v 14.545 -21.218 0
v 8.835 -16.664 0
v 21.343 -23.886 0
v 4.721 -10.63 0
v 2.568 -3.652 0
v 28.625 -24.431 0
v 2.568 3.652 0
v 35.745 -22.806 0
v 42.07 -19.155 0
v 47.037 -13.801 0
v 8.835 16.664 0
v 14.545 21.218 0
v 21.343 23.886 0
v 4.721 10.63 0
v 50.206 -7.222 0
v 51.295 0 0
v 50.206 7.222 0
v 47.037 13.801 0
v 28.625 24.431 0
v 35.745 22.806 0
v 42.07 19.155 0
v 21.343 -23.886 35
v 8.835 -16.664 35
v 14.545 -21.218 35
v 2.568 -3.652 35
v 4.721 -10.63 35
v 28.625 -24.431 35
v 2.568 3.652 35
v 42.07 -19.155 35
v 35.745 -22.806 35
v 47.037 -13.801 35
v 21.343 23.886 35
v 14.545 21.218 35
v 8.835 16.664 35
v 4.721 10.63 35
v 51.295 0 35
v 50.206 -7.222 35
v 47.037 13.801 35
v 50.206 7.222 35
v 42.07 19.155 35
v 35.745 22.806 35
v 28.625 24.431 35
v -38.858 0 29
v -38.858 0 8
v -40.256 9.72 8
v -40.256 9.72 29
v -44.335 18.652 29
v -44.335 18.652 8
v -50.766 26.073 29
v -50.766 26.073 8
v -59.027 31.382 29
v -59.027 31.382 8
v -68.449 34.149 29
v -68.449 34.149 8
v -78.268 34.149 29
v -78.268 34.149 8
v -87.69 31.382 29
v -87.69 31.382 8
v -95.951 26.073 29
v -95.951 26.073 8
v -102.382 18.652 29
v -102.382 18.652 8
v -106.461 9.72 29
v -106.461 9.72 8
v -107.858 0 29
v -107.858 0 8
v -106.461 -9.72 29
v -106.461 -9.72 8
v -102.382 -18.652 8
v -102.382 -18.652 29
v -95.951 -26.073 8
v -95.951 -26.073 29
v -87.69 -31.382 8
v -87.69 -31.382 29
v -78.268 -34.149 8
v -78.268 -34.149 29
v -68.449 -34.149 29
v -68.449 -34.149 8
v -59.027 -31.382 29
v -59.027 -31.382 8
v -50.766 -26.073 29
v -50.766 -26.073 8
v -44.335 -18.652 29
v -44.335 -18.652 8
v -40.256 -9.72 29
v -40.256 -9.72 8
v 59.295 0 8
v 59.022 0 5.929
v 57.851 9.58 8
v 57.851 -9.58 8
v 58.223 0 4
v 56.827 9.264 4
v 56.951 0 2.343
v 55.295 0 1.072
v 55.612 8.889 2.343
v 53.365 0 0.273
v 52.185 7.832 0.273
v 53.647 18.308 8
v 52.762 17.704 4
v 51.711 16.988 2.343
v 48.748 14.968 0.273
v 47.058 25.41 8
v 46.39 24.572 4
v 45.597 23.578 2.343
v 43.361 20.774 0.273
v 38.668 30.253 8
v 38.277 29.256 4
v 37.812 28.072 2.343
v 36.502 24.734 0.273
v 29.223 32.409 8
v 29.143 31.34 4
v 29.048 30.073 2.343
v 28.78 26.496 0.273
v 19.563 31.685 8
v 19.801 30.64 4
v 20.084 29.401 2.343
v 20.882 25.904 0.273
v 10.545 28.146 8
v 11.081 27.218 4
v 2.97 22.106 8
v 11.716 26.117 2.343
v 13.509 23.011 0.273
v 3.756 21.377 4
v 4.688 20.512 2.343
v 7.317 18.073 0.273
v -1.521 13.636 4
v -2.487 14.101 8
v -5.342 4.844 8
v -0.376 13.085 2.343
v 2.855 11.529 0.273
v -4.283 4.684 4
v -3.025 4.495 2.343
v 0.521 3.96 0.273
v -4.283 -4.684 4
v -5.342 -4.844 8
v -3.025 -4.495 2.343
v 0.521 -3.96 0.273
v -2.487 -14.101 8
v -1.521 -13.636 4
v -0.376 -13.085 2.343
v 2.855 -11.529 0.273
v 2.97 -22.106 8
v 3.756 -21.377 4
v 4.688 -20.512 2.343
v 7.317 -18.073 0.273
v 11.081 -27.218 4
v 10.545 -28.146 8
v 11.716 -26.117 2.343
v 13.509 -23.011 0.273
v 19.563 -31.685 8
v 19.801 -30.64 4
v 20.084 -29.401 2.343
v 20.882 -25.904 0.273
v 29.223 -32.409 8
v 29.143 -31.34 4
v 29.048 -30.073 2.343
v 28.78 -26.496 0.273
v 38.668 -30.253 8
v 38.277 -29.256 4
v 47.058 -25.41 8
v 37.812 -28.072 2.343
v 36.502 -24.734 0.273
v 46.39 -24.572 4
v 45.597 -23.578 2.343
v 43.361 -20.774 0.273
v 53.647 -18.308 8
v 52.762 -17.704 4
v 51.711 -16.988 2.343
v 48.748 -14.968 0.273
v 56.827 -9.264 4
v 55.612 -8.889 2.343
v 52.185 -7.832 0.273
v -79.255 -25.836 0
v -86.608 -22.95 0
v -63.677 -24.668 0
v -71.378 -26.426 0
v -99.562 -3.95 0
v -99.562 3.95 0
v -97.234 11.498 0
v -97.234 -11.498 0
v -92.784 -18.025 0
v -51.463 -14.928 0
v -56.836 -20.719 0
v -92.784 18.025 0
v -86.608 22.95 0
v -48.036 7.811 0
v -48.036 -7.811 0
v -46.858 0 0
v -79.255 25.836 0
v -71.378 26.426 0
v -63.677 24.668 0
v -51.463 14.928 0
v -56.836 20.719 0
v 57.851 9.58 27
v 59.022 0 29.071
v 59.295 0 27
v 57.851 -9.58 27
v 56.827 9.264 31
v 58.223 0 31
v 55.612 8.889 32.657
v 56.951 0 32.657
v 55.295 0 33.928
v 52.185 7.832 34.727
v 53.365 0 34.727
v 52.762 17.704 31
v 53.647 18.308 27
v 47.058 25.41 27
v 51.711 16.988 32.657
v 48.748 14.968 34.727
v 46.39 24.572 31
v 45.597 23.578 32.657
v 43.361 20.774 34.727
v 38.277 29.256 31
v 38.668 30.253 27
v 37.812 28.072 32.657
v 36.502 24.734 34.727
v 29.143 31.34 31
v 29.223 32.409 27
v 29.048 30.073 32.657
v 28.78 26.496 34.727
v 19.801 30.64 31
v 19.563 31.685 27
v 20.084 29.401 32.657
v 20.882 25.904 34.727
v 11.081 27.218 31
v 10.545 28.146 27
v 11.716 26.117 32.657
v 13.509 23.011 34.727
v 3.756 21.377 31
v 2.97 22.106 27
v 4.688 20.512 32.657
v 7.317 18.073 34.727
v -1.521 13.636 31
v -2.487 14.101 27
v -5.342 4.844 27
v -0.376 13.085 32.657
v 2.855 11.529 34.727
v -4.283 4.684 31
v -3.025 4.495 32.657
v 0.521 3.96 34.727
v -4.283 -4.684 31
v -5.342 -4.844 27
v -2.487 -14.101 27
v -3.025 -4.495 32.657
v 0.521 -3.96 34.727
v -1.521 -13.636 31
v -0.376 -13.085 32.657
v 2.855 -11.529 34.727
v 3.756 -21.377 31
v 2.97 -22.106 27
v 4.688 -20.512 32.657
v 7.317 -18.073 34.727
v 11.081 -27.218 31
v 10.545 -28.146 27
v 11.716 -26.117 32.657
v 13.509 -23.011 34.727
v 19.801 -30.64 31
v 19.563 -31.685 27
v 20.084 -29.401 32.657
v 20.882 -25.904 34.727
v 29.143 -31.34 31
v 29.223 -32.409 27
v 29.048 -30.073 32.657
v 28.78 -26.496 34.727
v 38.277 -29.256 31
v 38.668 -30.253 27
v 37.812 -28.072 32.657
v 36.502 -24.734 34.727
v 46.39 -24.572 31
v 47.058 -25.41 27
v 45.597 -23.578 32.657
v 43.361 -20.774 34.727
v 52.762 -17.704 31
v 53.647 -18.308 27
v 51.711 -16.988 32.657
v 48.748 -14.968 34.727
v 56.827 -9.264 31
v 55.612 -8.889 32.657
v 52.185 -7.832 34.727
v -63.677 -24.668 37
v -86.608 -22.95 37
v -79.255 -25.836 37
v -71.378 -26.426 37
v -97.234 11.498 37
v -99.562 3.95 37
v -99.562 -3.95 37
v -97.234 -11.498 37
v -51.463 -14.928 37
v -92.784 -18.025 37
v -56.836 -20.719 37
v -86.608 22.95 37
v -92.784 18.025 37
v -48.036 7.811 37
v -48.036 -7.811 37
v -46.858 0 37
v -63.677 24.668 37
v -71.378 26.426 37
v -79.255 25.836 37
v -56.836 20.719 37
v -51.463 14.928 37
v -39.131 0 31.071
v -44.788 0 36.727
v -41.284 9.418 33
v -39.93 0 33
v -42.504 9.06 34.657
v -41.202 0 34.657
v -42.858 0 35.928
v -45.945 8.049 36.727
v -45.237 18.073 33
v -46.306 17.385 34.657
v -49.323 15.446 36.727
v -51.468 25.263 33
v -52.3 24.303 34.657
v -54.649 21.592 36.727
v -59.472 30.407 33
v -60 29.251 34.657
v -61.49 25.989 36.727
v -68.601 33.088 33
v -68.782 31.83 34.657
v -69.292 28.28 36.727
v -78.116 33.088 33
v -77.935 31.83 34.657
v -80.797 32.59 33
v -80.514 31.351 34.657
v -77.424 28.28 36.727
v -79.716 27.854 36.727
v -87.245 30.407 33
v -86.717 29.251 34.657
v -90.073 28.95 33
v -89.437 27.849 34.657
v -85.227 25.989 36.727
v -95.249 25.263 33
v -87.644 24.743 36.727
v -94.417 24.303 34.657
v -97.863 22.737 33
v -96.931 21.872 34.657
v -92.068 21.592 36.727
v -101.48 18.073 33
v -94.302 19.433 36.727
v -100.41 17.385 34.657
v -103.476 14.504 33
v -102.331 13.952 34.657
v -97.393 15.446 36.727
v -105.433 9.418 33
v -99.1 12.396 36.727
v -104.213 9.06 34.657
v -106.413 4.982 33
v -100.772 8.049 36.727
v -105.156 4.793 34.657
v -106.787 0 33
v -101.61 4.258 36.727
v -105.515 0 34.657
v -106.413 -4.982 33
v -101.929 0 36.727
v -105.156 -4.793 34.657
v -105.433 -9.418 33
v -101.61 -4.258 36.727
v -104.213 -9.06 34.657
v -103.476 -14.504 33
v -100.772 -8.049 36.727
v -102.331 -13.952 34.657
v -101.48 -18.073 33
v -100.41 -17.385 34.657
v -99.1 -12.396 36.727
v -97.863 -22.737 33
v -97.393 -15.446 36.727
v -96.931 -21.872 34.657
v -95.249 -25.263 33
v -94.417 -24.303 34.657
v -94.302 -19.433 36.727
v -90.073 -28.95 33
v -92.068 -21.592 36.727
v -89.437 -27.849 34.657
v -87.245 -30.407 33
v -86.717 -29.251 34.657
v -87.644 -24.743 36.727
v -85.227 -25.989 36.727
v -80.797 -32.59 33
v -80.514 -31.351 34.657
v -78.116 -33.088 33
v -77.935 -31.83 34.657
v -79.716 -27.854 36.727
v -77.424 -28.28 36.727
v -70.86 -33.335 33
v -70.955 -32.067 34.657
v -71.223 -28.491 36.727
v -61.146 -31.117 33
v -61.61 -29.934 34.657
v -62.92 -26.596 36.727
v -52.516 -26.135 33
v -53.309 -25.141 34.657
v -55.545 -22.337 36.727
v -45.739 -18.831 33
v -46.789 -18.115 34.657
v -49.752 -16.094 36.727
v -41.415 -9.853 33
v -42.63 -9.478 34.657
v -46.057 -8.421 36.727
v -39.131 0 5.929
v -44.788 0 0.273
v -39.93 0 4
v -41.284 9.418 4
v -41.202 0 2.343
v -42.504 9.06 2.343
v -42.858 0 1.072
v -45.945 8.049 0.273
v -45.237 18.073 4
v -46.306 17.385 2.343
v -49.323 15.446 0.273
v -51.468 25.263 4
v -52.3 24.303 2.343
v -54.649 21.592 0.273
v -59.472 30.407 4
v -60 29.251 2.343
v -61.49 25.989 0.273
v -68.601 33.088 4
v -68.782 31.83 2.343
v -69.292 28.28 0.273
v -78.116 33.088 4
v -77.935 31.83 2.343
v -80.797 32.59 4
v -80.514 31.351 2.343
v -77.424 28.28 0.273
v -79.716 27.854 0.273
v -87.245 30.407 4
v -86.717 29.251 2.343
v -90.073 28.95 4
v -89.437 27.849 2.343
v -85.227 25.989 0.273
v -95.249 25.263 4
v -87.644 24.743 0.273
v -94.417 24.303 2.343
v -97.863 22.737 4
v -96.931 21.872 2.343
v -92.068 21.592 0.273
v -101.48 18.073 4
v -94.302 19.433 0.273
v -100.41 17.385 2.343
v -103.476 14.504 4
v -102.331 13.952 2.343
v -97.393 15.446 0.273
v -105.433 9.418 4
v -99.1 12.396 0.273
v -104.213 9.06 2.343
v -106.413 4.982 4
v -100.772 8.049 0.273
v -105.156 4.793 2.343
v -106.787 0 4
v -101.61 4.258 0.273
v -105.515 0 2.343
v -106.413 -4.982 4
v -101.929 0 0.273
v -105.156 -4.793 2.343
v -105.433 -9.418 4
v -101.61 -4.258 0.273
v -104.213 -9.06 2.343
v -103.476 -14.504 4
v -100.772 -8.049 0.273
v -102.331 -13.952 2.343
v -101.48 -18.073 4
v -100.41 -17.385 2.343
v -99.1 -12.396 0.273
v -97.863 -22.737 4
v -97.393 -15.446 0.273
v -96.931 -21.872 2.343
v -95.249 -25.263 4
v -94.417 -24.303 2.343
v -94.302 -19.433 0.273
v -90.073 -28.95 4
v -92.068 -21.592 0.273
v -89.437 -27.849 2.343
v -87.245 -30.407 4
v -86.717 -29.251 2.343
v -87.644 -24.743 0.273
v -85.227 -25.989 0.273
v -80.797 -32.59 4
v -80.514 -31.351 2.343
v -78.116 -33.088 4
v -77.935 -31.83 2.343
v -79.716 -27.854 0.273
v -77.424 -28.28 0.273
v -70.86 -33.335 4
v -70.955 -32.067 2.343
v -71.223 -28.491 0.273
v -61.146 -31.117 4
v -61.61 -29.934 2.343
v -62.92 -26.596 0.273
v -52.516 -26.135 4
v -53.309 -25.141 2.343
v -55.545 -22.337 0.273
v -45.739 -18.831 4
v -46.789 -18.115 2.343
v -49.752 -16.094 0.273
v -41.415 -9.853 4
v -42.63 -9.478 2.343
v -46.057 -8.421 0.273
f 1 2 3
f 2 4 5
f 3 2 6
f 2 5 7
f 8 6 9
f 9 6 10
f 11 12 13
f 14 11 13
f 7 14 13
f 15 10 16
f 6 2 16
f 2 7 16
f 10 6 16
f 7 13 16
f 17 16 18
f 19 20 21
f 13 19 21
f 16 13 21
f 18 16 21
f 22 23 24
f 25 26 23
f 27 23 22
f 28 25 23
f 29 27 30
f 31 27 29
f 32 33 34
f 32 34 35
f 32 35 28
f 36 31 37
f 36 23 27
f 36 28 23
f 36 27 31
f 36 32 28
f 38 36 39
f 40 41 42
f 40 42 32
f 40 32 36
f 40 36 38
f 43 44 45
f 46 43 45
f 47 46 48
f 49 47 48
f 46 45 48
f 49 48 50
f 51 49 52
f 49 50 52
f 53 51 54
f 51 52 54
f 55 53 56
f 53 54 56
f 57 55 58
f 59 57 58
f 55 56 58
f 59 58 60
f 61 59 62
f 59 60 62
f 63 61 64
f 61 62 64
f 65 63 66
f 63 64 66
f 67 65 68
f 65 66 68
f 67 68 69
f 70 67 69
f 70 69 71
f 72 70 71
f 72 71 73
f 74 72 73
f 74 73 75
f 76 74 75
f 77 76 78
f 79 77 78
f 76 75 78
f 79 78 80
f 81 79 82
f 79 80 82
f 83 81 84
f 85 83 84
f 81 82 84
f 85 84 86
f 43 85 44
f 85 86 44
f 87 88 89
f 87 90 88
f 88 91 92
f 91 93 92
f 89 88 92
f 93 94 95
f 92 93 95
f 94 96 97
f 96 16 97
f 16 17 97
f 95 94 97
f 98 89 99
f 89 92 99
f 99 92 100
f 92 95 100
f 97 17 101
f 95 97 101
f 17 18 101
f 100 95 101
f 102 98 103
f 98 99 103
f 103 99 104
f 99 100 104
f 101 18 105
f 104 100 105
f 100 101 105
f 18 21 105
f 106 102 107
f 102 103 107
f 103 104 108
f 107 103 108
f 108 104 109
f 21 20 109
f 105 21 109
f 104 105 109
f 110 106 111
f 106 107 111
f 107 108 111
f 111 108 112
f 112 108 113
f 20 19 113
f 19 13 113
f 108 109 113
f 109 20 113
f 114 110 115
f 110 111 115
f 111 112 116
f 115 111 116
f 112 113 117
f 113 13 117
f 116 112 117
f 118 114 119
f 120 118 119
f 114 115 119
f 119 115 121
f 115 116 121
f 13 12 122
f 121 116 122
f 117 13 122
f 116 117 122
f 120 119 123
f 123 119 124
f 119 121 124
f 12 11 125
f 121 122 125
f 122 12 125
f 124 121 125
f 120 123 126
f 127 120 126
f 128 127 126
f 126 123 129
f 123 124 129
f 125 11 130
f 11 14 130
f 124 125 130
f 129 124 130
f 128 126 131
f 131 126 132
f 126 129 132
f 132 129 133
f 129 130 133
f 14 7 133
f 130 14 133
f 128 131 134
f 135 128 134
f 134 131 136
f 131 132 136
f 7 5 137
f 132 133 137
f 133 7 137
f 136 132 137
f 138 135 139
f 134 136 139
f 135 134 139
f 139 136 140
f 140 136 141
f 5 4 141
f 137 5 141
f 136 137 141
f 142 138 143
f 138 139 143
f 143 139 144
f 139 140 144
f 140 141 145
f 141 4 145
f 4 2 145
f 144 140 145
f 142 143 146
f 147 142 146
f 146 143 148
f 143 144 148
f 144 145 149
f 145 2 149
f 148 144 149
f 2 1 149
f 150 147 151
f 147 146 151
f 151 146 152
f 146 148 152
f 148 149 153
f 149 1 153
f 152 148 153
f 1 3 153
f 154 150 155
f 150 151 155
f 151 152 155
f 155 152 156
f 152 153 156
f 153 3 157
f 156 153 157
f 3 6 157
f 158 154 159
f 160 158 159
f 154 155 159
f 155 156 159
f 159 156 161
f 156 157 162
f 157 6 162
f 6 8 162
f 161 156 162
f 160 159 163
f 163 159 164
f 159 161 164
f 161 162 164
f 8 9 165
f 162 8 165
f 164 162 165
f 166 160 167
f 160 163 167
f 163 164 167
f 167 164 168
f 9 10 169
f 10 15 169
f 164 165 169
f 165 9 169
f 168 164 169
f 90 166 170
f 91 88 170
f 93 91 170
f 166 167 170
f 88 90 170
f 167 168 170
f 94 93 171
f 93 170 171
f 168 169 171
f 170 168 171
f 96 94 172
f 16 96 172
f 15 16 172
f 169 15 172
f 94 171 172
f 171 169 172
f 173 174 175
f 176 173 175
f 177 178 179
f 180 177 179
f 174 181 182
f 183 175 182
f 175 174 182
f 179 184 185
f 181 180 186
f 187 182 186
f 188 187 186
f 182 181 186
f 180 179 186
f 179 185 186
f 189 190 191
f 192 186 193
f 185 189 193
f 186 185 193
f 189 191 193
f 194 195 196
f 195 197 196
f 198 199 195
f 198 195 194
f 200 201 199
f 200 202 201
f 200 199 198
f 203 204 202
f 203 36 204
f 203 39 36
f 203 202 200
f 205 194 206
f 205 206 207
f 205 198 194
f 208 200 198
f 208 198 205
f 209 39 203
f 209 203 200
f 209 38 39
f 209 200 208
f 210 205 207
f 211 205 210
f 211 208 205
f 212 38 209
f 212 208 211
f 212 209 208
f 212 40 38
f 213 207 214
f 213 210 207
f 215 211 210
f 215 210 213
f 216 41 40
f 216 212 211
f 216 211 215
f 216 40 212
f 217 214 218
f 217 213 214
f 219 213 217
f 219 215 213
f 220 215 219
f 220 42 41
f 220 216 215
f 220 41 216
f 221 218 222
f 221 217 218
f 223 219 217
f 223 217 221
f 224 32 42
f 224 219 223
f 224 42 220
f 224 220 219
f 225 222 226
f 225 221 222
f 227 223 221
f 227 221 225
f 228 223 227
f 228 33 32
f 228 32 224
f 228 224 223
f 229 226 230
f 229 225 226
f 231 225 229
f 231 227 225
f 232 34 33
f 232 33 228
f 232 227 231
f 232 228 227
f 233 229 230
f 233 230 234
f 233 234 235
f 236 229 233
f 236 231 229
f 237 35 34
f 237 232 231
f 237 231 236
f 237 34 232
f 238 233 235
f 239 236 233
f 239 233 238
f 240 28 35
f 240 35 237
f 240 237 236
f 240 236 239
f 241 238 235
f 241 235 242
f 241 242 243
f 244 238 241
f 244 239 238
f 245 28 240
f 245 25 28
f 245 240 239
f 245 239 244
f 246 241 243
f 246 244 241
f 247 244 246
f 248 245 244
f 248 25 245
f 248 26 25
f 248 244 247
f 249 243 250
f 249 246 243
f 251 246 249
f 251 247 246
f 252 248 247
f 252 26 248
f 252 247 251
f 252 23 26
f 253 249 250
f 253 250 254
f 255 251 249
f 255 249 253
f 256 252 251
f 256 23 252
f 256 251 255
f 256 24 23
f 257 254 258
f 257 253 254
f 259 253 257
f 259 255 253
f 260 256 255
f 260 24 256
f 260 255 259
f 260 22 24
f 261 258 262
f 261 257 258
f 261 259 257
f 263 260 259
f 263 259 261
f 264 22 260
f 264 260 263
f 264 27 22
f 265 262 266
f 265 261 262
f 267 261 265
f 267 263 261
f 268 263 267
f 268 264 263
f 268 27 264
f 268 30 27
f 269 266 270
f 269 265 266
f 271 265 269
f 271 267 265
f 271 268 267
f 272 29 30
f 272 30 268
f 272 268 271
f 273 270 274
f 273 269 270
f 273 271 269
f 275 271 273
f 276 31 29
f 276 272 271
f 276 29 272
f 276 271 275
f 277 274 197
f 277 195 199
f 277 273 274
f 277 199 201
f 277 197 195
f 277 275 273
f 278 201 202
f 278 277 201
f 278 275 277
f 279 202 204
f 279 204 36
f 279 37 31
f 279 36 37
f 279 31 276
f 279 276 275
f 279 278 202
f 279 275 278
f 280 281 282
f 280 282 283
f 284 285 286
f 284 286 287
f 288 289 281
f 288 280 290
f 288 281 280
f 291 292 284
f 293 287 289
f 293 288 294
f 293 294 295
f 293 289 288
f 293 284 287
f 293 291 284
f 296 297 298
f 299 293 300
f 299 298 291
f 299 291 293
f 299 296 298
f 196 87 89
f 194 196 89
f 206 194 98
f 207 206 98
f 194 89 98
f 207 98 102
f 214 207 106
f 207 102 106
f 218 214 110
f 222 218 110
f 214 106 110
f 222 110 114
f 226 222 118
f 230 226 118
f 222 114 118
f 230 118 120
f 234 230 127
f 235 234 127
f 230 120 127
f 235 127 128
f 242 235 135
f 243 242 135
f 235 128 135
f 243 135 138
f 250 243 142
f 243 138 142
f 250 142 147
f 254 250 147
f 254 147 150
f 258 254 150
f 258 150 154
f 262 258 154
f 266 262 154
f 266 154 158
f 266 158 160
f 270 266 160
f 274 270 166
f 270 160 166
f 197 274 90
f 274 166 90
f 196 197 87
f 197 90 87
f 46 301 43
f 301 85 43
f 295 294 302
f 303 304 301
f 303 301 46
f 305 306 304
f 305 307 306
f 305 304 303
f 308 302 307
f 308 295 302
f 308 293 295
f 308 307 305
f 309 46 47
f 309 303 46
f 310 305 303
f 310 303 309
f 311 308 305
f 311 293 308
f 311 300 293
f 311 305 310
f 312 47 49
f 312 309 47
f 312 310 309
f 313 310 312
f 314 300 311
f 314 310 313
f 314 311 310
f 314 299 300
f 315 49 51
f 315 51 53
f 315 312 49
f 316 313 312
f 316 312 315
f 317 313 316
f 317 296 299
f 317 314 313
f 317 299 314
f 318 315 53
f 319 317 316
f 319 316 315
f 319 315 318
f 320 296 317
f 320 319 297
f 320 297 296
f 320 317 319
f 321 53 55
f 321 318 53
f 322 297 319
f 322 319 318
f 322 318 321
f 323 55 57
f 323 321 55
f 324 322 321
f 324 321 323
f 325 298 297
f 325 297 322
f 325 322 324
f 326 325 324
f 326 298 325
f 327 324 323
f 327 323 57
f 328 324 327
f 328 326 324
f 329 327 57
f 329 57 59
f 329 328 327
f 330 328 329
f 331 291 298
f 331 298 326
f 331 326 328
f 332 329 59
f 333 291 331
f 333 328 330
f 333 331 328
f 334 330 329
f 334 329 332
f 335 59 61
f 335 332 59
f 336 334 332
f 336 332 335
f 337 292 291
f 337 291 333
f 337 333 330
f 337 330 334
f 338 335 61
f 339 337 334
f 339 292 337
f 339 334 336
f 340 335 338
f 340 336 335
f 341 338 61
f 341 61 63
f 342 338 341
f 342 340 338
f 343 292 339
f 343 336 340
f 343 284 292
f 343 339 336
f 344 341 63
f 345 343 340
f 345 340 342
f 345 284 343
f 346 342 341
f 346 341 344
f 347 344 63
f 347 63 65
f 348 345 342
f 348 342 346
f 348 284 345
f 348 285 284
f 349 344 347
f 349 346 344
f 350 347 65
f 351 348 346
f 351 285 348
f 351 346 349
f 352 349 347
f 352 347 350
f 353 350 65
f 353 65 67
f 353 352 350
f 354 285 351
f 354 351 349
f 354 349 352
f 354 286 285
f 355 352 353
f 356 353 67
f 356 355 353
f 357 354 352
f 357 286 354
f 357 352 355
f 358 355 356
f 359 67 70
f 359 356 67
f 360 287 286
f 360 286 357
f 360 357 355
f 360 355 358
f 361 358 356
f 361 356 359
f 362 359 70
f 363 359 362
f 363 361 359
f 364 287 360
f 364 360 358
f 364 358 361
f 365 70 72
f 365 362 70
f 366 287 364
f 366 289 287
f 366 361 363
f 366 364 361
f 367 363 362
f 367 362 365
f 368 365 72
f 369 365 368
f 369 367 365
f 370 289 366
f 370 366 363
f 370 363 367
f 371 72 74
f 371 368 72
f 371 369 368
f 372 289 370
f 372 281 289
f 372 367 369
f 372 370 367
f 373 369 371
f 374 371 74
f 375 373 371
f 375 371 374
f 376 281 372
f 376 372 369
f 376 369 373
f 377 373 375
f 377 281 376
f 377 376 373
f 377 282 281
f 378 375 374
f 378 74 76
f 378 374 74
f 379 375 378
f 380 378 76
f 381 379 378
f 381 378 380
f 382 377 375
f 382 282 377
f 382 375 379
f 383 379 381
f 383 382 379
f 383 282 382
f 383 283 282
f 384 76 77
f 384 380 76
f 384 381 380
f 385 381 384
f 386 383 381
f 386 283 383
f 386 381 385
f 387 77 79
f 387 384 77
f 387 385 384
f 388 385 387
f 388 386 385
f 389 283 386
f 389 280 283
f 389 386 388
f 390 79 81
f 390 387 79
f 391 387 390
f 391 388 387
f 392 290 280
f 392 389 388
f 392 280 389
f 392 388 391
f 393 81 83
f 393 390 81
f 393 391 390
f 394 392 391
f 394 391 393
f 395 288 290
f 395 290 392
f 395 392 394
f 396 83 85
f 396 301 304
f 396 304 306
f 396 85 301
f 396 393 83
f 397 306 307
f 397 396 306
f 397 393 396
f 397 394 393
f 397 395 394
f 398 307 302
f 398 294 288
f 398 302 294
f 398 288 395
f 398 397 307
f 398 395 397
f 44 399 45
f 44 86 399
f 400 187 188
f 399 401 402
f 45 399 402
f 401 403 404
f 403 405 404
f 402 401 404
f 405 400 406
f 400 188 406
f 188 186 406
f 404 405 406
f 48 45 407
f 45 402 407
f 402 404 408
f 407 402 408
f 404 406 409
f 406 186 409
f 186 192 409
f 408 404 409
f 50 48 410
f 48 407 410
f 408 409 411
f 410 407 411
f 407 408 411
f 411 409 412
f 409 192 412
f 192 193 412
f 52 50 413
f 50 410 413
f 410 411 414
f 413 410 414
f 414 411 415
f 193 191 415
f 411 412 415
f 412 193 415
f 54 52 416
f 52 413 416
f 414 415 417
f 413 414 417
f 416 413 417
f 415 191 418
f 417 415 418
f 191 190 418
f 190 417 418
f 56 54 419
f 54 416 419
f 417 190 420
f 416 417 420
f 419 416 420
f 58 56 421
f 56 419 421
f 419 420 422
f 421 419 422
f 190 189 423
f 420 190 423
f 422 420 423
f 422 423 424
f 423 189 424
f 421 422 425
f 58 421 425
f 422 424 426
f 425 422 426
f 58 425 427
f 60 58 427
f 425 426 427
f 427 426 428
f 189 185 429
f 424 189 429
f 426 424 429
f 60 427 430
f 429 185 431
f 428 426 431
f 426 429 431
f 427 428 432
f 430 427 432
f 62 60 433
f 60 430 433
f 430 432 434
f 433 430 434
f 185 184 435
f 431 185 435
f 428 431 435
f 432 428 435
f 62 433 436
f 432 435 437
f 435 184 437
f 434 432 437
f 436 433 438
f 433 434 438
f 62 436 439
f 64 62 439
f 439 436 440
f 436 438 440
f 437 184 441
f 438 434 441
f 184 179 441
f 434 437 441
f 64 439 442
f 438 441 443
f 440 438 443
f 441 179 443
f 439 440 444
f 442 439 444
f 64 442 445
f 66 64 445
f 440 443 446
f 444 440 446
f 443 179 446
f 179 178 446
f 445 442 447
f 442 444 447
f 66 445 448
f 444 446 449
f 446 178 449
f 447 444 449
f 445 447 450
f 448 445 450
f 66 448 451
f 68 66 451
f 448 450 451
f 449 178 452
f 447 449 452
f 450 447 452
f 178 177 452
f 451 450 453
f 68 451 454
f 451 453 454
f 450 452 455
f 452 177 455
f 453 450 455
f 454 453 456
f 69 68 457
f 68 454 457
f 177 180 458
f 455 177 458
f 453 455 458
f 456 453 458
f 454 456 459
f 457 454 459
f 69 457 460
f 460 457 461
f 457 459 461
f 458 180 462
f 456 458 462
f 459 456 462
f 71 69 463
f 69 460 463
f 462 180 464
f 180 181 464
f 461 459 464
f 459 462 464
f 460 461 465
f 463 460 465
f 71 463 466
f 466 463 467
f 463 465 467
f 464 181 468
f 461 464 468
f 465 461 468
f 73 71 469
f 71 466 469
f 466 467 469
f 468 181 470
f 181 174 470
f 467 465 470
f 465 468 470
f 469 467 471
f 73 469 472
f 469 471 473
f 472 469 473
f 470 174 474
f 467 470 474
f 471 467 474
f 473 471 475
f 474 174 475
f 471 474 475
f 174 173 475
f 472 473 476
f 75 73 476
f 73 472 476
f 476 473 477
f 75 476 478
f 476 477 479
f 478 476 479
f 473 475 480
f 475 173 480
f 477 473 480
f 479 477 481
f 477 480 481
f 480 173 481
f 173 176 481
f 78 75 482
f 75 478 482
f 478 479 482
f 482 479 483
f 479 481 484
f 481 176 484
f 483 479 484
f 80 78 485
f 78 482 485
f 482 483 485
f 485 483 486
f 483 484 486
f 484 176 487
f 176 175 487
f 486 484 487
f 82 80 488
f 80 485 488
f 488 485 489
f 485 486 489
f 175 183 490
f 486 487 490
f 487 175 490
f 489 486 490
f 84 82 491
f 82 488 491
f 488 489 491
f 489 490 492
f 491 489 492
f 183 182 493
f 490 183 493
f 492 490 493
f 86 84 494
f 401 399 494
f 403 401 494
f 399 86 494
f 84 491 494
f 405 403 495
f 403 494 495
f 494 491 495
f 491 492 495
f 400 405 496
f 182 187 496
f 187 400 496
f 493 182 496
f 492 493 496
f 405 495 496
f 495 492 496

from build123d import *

# Parameters (mm, degrees)
F0_R     = 34.5
F1_DEPTH = 37
F0_R_2   = 32.5
F2_DEPTH = 35
F3_R     = 8
F3_2_R   = 8


with BuildPart() as f1:
    # F0 (on Top) → F1 (new body)
    with BuildSketch(Plane.XY):
        with Locations((-73.358402, 0)):
            Circle(F0_R)
    extrude(amount=F1_DEPTH)

    # F3
    f3_edges = [f1.edges().sort_by_distance(p)[0] for p in [
        (-107.858402, 0, 37),
        (-107.858402, 0, 0),
    ]]
    fillet(f3_edges, radius=F3_R)


with BuildPart() as f2:
    # F0 (on Top) → F2 (new body)
    with BuildSketch(Plane.XY):
        with Locations((26.794609, 0)):
            Circle(F0_R_2)
    extrude(amount=F2_DEPTH)

    # F3#2
    f3_2_edges = [f2.edges().sort_by_distance(p)[0] for p in [
        (-5.705391, 0, 0),
        (-5.705391, 0, 35),
    ]]
    fillet(f3_2_edges, radius=F3_2_R)


solid = Compound([f1.part, f2.part])
